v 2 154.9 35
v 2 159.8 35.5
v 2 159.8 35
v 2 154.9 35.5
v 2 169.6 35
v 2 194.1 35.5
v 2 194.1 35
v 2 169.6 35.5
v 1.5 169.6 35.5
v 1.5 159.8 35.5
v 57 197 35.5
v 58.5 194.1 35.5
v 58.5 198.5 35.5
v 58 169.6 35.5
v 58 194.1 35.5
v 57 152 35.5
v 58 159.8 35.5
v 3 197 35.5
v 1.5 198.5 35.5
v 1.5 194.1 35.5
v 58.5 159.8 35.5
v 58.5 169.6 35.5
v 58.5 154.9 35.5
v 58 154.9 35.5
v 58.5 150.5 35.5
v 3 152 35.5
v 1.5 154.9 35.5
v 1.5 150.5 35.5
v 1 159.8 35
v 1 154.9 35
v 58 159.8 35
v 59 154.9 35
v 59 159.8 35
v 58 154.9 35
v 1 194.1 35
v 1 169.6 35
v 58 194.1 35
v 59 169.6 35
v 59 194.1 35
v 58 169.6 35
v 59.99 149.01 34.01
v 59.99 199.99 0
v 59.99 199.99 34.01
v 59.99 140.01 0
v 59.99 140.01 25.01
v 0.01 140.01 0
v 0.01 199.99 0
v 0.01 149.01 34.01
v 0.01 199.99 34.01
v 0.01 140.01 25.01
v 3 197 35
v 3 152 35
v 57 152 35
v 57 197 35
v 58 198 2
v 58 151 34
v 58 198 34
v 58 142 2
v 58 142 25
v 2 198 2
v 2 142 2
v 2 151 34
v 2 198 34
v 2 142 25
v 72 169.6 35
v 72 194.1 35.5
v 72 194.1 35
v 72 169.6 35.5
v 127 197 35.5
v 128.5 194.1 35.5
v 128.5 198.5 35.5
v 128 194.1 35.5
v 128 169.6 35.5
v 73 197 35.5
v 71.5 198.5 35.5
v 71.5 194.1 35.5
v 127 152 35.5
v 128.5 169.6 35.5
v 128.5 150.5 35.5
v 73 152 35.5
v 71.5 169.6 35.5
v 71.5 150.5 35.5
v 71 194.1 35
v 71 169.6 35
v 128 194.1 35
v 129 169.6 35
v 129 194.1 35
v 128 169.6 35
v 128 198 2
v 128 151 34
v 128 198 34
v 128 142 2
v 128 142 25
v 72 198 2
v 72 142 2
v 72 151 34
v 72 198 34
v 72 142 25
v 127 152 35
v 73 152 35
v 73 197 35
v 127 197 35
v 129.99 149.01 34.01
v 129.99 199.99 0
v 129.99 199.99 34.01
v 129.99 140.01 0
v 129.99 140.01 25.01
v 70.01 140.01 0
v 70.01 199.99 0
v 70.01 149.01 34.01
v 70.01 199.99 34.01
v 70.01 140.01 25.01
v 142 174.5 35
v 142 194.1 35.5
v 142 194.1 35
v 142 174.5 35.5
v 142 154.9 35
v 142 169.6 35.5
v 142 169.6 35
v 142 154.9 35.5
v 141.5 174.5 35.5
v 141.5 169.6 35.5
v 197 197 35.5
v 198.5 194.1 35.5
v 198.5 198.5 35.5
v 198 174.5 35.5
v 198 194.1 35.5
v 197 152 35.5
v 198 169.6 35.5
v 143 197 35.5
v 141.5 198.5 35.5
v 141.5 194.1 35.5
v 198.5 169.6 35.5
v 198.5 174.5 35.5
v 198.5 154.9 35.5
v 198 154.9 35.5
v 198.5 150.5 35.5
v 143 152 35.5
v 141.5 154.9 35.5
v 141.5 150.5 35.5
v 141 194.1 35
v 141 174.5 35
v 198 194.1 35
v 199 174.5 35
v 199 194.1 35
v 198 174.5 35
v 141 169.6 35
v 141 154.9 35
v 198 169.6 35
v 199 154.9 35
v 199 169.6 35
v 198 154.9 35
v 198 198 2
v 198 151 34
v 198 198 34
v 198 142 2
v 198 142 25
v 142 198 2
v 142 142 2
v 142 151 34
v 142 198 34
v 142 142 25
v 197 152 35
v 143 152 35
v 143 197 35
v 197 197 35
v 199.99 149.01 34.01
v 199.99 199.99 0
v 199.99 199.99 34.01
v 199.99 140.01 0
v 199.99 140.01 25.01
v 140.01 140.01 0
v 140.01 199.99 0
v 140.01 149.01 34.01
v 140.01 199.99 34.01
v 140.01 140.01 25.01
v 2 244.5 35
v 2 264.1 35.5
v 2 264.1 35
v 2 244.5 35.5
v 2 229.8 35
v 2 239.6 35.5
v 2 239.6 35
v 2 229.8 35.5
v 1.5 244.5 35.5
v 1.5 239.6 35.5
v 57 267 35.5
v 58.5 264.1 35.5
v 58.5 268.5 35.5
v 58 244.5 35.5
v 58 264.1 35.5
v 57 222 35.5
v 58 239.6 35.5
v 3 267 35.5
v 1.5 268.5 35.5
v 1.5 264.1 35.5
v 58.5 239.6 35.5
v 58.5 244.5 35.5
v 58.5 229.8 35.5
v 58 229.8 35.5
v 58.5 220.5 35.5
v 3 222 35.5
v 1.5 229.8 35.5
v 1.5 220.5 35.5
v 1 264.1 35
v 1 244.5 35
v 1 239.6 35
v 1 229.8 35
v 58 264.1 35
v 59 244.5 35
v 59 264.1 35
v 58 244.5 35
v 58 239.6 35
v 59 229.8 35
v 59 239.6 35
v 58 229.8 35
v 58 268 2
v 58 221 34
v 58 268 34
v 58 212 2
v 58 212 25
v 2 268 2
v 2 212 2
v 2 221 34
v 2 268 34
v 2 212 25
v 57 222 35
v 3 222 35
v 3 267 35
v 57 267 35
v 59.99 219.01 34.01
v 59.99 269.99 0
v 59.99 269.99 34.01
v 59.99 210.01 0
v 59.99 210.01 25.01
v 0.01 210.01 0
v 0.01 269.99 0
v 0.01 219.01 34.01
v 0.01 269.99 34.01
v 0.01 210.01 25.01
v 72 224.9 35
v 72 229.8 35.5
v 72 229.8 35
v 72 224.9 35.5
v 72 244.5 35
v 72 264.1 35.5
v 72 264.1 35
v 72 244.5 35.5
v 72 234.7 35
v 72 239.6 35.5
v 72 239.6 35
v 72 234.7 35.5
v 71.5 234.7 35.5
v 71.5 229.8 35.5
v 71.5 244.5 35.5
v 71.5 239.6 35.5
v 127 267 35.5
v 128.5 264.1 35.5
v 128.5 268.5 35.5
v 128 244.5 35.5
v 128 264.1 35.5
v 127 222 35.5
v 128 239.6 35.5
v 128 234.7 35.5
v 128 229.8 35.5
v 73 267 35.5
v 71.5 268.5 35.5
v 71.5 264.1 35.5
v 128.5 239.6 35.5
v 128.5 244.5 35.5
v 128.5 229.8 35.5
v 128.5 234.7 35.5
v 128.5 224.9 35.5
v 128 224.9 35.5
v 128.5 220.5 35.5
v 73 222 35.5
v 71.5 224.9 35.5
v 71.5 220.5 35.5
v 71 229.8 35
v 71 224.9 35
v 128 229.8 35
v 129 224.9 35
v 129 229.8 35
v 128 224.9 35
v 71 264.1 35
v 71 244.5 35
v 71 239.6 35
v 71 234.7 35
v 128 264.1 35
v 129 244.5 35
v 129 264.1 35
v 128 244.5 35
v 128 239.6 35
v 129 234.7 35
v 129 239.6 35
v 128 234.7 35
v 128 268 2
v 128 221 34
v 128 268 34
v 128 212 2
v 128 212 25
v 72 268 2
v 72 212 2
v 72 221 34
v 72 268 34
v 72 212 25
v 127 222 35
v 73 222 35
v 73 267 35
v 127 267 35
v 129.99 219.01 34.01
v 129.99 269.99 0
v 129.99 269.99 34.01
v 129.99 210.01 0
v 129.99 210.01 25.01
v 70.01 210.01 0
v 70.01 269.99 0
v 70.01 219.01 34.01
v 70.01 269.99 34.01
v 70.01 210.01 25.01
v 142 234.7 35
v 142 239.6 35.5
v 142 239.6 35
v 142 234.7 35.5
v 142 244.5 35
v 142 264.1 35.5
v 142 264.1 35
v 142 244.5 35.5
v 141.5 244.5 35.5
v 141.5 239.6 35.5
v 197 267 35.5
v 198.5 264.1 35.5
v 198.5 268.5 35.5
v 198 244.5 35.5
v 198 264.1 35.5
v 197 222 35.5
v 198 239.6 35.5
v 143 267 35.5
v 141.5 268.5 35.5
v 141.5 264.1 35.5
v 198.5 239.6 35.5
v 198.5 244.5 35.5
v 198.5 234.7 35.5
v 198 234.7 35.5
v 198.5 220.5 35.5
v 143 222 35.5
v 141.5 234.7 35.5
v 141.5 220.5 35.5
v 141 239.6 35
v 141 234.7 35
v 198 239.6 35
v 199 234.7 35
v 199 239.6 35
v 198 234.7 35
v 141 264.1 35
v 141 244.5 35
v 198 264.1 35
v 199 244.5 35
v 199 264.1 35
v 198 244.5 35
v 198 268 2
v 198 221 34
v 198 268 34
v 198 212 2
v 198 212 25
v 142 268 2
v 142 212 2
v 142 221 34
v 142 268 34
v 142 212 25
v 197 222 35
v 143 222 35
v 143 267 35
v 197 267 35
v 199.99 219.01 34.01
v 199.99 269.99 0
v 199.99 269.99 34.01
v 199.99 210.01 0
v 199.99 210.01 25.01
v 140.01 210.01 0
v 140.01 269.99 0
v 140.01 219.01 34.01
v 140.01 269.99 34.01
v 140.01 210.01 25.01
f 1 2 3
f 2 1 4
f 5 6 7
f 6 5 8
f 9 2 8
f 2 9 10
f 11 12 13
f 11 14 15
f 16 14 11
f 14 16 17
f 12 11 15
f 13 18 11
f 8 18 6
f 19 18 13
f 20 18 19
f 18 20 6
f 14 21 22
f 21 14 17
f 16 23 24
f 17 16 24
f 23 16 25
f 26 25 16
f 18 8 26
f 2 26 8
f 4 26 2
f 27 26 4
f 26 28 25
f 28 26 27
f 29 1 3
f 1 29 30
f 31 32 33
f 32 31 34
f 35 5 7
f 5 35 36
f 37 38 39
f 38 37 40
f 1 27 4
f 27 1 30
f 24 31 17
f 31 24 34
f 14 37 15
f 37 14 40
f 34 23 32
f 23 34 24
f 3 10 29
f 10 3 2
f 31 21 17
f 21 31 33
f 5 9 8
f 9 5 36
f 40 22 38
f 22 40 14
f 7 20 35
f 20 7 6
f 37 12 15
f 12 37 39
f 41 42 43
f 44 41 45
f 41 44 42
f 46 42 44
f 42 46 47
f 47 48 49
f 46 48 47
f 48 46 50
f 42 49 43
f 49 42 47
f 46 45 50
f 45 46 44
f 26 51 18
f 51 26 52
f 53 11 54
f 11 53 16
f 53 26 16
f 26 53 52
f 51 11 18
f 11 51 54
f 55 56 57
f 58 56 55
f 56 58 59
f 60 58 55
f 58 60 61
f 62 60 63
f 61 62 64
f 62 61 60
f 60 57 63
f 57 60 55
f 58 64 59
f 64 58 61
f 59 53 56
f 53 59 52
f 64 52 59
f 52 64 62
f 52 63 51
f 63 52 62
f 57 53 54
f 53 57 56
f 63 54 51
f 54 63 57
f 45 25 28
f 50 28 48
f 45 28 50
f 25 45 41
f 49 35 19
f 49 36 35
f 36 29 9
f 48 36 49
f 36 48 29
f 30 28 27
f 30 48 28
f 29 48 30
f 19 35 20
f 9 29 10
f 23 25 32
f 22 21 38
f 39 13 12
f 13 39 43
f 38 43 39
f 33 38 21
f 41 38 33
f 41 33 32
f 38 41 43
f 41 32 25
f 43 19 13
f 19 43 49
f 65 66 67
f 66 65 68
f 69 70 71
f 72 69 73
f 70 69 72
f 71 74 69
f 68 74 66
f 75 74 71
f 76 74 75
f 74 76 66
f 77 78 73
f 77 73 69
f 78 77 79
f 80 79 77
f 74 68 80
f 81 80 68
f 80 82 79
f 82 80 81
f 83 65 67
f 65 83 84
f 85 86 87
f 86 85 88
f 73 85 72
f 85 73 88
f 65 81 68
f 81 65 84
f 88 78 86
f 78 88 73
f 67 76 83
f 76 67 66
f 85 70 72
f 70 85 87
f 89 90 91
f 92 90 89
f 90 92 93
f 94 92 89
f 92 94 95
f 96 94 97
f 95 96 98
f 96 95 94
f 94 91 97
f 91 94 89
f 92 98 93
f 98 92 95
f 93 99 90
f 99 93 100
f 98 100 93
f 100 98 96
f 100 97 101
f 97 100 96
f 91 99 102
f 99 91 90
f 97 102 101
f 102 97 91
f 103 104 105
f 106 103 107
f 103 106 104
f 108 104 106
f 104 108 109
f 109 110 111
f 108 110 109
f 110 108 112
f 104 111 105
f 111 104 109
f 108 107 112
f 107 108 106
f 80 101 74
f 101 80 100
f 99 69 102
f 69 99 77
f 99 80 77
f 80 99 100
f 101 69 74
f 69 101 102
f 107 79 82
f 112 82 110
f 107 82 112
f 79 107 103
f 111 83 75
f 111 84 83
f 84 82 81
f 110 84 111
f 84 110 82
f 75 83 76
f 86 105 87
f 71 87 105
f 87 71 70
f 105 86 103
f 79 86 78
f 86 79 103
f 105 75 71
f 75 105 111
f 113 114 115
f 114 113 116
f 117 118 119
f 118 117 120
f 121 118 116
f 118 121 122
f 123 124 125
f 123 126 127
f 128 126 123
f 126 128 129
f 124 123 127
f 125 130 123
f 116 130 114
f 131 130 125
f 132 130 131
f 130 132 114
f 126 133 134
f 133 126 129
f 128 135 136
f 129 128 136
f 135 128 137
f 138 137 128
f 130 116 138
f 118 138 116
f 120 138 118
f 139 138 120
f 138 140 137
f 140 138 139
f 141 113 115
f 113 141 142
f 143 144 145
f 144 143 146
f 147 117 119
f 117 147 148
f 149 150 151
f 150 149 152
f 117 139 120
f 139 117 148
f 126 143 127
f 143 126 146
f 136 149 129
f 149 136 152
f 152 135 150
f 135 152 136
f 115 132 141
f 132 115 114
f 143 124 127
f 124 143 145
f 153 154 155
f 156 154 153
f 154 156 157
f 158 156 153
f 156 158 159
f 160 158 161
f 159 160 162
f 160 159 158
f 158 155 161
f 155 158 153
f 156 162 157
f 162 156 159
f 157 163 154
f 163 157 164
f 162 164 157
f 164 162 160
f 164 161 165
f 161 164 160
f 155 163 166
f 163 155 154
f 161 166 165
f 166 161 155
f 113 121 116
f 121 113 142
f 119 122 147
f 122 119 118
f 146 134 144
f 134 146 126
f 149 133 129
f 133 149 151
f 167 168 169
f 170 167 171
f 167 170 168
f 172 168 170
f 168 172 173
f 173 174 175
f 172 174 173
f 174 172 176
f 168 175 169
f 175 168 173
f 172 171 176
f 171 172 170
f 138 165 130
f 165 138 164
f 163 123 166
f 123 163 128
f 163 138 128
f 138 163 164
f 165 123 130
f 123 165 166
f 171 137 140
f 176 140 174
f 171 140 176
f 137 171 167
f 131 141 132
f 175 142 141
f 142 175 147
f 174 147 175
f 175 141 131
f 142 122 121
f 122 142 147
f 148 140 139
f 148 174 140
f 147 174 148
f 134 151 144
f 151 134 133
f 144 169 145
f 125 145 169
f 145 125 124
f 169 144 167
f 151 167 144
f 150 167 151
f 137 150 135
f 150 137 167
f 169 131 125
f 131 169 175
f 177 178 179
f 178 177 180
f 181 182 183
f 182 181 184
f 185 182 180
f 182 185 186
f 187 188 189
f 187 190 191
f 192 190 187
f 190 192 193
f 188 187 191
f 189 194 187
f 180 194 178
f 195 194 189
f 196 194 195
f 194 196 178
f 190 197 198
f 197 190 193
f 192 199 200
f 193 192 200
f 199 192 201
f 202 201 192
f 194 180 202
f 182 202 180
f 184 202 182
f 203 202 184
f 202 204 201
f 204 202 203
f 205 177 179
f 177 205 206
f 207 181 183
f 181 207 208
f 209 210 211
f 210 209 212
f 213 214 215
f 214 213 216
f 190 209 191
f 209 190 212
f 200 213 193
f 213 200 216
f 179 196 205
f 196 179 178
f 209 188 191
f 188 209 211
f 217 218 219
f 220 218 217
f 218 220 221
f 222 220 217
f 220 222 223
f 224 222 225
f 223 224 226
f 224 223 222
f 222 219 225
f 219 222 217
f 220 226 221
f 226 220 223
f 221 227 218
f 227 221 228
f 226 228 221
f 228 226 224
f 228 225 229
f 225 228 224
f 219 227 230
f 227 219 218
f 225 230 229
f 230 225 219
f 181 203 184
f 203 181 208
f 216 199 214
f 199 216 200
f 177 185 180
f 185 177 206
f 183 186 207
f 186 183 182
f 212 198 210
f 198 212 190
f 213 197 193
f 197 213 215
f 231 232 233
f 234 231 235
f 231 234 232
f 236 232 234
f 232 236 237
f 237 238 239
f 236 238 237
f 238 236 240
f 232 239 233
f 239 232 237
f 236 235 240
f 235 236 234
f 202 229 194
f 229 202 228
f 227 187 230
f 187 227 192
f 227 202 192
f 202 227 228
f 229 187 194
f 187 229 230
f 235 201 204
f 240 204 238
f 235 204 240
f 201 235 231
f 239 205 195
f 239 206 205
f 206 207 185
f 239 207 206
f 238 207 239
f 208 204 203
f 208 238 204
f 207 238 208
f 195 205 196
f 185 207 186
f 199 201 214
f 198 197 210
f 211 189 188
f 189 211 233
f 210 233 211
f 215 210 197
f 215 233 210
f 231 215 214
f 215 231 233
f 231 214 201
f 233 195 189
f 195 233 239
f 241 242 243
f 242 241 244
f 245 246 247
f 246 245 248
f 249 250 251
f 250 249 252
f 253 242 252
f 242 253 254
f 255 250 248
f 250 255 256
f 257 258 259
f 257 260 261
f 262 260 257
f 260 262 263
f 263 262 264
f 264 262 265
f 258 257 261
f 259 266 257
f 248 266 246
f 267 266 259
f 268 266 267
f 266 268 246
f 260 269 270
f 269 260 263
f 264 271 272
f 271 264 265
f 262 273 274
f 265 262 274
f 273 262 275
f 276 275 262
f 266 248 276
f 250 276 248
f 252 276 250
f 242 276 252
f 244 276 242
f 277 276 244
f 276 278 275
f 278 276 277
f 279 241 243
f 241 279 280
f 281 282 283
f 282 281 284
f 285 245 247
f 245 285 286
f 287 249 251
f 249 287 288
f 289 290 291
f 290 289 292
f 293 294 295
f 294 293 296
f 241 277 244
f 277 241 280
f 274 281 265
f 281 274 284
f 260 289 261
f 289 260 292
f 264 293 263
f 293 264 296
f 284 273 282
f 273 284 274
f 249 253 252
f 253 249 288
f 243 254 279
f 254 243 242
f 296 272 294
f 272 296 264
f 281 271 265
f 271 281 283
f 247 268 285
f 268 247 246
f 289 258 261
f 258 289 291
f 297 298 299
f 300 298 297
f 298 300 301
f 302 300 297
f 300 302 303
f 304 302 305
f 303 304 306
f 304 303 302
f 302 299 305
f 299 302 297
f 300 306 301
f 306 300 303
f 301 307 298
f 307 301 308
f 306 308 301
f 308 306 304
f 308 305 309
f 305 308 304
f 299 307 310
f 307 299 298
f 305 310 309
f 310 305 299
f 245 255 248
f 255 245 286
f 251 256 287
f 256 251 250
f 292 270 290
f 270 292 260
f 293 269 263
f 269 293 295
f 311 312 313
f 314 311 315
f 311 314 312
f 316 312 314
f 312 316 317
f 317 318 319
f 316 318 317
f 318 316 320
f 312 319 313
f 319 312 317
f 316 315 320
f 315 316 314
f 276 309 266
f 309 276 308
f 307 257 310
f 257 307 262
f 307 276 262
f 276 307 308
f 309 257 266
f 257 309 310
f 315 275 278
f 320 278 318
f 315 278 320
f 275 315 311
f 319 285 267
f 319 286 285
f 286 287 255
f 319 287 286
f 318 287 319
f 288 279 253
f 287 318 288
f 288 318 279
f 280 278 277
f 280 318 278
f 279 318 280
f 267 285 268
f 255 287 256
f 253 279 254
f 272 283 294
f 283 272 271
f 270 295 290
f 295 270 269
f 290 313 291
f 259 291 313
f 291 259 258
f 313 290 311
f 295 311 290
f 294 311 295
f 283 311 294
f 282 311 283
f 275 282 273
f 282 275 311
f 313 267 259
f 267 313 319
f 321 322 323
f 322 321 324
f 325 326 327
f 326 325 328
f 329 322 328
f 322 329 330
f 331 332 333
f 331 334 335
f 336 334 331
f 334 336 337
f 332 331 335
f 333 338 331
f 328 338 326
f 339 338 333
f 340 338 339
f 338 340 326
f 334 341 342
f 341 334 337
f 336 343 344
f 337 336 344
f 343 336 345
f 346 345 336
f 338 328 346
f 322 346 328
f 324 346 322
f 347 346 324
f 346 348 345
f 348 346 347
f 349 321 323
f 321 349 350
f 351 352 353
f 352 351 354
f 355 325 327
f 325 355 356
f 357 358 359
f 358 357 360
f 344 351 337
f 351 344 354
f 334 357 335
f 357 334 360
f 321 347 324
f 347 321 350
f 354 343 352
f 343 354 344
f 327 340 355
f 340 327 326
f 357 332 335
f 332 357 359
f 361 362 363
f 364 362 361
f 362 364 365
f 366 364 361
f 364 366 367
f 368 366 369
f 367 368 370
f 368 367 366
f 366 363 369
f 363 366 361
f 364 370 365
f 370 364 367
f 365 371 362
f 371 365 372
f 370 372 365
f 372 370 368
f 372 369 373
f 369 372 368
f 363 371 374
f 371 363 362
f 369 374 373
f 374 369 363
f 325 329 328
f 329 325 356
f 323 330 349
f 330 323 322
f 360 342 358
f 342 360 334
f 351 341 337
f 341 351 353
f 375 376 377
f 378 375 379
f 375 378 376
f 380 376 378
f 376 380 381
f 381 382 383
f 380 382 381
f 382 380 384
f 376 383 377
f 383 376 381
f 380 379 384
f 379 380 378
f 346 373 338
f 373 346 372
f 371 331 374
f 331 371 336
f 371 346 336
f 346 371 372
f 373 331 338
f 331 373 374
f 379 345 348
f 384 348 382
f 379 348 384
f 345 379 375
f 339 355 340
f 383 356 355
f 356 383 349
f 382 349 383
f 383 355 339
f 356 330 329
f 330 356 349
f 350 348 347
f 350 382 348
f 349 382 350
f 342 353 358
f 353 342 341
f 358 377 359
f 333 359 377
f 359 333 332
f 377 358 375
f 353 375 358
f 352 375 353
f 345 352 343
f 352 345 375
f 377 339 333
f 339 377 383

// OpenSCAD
big = 100;

width = 60;
depth = 60;
height = 35;

thickness = 2;
labelHeight = 10;
codeHeight = 1;
codeColorLayerThickness = 0.5;
epsilon = 0.01;

for (id = [6:1:11]) {
  translate([id%3*(width+10),floor(id/3)*(width+10),0])
  box(boxID=id, width=width, height=height, depth=depth, codeColorLayerThickness=codeColorLayerThickness);
}

//box(boxID=85, width=width, height=height, depth=depth, codeColorLayerThickness=codeColorLayerThickness);

module box(boxID=0, height=10, width=10, depth=10, epslion=0.01, codeColorLayerThickness=codeColorLayerThickness) {
  internalID = 1 + boxID * 2 + 512; // we set always the first and last segment on 
  difference() {
    union() {
      translate([epsilon, epsilon,0]) cube([width-2*epsilon, depth-2*epsilon, height]);
      // top red contour  
      color("green") translate([codeHeight+thickness/2,0,height]) cube([thickness/2, width, codeColorLayerThickness]); // left
      color("blue") translate([width-codeHeight-thickness,0,height]) cube([thickness/2, width, codeColorLayerThickness]); // right
      color("red") translate([0,labelHeight,height]) cube([width, thickness, codeColorLayerThickness]); // front
      color("red") translate([0,depth-codeHeight-thickness,height]) cube([width, thickness, codeColorLayerThickness]); // back

    // code
      realSideLength = depth - codeHeight - labelHeight;
      segmentLength = realSideLength / 10;
        
      for (i = [0:9]) {
        isSet = floor(internalID / 2^i) % 2;
        echo(internalID / 2^i);
        if (isSet) {
          echo(i);
        barShift = i * segmentLength;
        color("green") translate([codeHeight,labelHeight+barShift,height]) cube([thickness/2, segmentLength, codeColorLayerThickness]); // left
        color("blue") translate([width-codeHeight-thickness/2,labelHeight+barShift,height]) cube([thickness/2, segmentLength, codeColorLayerThickness]); // right

        }
      }
    }
    
    difference () {
      translate([thickness, thickness, thickness]) cube([width - 2 * thickness, depth - 2 * thickness, height]);
    
      // cut out the label
      translate([0,thickness, height - labelHeight]) rotate(45, [1,0,0]) cube(big);
      translate([thickness,0, height - codeHeight ]) rotate(90) rotate(45, [1,0,0]) cube(big);
      translate([width-thickness,0, height - codeHeight ]) rotate(90) rotate(45, [1,0,0]) cube(big);
      translate([0,depth - thickness , height - codeHeight]) rotate(45, [1,0,0]) cube(big);
    }

    // remove the external part of the labels
    translate([0, 0, height - labelHeight]) rotate(45, [1,0,0]) cube(big); // fonrt
    translate([0, 0, height - codeHeight ]) rotate(90) rotate(45, [1,0,0]) cube(big); // left
    translate([width, 0, height - codeHeight ]) rotate(90) rotate(45, [1,0,0]) cube(big);
    translate([0, depth , height - codeHeight]) rotate(45, [1,0,0]) cube(big);


  }

}
